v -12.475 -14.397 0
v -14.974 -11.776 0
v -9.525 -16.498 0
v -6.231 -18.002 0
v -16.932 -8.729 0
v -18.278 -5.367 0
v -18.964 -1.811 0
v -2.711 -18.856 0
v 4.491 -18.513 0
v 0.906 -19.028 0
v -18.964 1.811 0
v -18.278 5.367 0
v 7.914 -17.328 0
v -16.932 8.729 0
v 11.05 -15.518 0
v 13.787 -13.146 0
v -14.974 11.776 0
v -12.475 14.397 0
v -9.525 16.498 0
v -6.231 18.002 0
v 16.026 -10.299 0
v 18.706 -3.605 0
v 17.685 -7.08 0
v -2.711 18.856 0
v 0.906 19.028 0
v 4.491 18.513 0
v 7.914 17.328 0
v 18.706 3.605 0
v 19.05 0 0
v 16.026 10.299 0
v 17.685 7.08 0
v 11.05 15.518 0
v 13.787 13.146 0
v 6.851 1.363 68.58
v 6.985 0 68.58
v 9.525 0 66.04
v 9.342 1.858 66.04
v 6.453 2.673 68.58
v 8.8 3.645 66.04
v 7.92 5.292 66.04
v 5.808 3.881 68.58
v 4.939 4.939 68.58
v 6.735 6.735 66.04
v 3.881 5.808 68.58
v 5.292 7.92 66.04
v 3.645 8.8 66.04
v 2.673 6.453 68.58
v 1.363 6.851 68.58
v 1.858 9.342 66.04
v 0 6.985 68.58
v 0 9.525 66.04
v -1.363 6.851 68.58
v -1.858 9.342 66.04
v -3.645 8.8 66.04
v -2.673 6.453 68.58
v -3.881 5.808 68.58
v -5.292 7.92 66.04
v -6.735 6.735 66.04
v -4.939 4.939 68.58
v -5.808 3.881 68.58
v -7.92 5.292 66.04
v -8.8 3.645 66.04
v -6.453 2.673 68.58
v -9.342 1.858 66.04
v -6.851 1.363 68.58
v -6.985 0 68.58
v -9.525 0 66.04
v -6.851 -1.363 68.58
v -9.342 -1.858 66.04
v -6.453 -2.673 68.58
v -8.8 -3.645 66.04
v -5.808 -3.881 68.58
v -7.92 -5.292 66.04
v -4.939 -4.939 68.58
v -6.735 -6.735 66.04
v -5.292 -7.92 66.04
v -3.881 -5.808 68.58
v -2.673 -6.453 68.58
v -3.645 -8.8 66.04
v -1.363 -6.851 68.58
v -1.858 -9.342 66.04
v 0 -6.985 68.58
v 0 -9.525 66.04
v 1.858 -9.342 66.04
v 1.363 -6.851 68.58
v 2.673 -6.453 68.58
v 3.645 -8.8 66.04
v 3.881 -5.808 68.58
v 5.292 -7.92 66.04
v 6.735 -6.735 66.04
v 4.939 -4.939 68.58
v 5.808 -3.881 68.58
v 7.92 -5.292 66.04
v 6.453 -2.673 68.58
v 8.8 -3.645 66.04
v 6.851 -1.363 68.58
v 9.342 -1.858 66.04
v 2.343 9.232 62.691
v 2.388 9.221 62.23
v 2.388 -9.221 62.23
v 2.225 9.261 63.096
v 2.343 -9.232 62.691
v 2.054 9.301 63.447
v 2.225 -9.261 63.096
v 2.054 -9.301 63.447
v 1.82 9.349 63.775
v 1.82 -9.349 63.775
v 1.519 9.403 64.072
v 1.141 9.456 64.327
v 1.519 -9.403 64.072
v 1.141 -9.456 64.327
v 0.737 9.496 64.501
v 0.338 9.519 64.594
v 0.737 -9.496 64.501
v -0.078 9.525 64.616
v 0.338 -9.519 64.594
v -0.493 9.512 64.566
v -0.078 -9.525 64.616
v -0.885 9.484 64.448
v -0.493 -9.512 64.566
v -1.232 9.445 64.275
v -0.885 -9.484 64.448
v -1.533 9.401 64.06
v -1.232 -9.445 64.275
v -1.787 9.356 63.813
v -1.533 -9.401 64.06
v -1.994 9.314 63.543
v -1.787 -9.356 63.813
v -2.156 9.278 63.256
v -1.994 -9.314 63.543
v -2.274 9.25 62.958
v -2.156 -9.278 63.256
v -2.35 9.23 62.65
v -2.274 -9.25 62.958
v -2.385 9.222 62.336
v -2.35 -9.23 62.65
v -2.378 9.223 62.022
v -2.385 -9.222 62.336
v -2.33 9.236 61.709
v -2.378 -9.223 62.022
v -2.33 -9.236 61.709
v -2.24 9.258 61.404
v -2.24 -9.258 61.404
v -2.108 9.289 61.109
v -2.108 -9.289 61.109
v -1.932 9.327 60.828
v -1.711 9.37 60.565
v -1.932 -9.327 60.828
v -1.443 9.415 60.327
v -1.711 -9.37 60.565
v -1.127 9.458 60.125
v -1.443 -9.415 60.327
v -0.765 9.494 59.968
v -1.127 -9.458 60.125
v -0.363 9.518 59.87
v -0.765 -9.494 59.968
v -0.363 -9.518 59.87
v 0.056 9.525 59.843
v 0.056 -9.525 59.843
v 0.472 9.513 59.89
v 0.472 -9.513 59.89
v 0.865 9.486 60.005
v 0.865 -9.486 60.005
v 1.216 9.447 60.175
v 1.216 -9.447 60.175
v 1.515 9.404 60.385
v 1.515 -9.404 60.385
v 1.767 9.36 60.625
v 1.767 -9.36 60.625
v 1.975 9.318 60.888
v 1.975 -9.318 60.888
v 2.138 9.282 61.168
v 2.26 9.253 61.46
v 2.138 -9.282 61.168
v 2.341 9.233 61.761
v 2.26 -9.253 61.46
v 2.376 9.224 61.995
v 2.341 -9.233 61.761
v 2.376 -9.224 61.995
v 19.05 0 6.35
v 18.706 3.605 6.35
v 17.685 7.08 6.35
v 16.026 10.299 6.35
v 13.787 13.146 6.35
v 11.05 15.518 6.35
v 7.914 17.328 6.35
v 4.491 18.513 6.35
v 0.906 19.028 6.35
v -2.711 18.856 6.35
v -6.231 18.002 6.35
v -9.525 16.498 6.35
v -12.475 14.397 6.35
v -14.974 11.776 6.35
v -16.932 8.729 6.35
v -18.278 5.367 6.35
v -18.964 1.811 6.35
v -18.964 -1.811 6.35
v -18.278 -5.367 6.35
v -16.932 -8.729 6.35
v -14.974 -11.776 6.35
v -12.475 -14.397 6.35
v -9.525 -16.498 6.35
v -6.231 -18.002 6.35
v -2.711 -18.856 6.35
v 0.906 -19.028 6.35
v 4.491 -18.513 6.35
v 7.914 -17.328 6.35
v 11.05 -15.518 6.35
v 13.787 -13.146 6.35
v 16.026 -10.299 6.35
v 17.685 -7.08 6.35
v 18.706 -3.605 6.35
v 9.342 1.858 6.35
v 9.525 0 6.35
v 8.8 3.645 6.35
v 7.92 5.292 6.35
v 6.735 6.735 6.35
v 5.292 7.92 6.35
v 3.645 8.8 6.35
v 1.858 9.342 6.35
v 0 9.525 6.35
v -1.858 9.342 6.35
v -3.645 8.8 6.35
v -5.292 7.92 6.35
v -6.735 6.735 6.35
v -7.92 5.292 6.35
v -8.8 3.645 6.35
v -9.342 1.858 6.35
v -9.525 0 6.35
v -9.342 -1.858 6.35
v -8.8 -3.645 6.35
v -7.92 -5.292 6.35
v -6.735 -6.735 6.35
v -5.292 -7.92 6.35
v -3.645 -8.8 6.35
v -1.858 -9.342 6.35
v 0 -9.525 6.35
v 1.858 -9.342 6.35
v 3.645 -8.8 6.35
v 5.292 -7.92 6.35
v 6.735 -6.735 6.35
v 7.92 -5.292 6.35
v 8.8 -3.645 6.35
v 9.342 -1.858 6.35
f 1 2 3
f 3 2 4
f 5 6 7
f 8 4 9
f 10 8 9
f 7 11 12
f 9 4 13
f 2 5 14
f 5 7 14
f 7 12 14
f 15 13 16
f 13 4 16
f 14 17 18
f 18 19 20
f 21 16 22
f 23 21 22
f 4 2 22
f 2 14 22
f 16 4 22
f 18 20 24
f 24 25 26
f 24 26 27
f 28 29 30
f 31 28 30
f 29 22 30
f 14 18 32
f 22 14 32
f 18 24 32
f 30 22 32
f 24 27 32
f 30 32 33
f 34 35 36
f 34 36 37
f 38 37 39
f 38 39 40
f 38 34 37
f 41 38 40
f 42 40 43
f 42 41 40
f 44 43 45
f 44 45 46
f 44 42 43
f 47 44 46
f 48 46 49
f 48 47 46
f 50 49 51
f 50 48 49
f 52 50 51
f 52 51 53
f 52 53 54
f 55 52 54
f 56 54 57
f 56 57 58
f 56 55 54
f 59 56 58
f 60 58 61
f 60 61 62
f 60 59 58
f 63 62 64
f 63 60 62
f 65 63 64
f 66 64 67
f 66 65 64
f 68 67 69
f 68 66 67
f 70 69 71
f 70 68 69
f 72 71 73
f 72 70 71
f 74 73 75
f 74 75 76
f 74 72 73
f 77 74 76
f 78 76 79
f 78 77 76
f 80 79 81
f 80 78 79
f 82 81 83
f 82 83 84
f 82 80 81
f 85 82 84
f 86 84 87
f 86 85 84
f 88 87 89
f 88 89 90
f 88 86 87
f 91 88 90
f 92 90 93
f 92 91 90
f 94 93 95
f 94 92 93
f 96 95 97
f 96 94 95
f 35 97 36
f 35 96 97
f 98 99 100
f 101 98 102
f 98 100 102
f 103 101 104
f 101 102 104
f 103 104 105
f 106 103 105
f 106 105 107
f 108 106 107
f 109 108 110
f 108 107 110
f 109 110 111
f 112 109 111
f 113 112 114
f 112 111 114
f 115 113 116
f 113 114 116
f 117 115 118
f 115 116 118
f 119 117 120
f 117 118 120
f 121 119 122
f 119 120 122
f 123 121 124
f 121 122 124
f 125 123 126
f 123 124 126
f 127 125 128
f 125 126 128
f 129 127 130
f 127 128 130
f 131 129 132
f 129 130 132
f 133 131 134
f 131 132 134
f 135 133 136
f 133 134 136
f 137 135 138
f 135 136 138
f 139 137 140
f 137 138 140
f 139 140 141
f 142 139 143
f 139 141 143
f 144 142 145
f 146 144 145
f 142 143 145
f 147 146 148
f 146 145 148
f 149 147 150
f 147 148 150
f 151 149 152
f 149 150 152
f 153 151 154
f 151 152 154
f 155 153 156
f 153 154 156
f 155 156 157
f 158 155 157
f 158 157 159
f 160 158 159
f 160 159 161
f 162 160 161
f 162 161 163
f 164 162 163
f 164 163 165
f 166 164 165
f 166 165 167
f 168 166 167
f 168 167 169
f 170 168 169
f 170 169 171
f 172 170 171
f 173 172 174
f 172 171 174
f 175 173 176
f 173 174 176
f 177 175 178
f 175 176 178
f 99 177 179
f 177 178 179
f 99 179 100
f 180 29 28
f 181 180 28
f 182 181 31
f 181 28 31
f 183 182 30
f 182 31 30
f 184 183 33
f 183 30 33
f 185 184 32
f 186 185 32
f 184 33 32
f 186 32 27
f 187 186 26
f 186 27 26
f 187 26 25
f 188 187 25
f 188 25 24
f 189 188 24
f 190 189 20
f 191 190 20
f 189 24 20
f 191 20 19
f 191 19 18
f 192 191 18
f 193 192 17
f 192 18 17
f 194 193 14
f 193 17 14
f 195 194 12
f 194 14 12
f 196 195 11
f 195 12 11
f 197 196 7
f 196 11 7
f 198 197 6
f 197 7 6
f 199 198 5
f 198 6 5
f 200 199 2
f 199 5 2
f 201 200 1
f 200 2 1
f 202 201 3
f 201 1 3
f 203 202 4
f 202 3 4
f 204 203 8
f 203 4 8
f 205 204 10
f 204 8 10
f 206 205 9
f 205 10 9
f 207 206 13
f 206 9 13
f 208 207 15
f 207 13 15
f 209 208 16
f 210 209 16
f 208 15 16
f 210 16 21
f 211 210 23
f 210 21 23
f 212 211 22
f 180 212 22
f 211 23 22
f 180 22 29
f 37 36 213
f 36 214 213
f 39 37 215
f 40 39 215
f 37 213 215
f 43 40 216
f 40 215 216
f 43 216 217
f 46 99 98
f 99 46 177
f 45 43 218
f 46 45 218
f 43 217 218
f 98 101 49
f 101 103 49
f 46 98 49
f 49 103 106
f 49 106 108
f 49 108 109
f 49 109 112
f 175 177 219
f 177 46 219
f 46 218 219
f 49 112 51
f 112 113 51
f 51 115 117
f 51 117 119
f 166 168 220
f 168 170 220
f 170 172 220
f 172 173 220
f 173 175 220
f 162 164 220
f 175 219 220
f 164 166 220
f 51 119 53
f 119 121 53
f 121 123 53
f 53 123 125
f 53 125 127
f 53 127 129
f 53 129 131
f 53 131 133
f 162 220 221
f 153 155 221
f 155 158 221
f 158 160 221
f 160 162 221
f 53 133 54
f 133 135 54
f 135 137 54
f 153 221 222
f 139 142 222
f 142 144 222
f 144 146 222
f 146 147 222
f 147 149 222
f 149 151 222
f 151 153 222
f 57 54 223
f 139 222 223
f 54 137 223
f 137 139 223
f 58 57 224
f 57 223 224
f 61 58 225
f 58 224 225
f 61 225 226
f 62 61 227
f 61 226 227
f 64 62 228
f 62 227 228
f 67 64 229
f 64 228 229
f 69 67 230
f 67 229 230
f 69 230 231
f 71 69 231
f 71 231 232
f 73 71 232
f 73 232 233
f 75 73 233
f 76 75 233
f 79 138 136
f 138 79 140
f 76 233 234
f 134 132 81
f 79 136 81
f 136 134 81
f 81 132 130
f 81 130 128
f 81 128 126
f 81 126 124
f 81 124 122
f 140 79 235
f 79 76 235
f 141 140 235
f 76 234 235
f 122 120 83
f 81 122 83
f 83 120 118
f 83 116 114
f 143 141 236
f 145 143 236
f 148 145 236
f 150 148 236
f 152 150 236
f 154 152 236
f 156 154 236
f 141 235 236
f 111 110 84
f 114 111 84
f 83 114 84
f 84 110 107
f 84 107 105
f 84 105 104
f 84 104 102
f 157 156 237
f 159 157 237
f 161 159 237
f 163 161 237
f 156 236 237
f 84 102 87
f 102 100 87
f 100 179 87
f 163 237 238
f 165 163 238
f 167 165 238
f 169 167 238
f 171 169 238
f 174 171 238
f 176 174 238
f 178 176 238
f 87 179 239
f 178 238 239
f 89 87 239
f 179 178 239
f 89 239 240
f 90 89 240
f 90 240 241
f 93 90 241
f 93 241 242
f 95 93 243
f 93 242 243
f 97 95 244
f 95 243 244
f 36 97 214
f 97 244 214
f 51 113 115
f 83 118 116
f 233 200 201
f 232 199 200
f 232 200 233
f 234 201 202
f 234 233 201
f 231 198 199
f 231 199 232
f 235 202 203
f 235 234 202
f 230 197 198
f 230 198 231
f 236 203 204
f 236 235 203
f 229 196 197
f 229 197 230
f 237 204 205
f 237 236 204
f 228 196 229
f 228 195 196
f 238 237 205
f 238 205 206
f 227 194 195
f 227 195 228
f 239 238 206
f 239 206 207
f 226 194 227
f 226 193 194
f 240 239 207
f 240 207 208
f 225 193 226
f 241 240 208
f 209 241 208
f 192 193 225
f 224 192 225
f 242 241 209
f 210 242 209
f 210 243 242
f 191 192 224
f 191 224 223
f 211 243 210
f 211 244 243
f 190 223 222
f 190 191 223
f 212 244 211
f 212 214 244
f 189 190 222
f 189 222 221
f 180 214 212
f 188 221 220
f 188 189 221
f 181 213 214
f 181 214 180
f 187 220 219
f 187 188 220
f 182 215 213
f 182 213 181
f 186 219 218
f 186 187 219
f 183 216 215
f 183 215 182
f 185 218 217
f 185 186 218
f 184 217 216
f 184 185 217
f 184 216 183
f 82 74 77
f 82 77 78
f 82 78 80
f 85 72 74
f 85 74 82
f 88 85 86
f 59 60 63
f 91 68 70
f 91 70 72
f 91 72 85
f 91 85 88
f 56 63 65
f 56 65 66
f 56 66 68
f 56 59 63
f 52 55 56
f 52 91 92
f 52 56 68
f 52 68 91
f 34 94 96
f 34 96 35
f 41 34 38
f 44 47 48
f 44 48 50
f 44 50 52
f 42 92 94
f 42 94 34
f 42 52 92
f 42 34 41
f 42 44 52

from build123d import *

# Parameters (mm, degrees)
F0_R     = 19.05
F1_DEPTH = 6.35
F2_R     = 9.525
F3_DEPTH = 62.23
F4_SIZE  = 2.54
F5_R     = 2.3876
F6_DEPTH = 12.7


with BuildPart() as f1:
    # F0 (on Top) → F1 (new body)
    with BuildSketch(Plane.XY):
        Circle(F0_R)
    extrude(amount=F1_DEPTH)

    # F2 (on face) → F3 (join)
    with BuildSketch(Plane.XY.offset(6.35)):
        Circle(F2_R)
    extrude(amount=F3_DEPTH)

    # F4
    f4_edges = [f1.edges().sort_by_distance(p)[0] for p in [
        (-9.525, 0, 68.58),
    ]]
    chamfer(f4_edges, length=F4_SIZE)

    # F5 (on Front) → F6 (cut, symmetric)
    with BuildSketch(Plane.XZ):
        with Locations((0, 62.23)):
            Circle(F5_R)
    extrude(amount=F6_DEPTH, both=True, mode=Mode.SUBTRACT)


solid = f1.part
